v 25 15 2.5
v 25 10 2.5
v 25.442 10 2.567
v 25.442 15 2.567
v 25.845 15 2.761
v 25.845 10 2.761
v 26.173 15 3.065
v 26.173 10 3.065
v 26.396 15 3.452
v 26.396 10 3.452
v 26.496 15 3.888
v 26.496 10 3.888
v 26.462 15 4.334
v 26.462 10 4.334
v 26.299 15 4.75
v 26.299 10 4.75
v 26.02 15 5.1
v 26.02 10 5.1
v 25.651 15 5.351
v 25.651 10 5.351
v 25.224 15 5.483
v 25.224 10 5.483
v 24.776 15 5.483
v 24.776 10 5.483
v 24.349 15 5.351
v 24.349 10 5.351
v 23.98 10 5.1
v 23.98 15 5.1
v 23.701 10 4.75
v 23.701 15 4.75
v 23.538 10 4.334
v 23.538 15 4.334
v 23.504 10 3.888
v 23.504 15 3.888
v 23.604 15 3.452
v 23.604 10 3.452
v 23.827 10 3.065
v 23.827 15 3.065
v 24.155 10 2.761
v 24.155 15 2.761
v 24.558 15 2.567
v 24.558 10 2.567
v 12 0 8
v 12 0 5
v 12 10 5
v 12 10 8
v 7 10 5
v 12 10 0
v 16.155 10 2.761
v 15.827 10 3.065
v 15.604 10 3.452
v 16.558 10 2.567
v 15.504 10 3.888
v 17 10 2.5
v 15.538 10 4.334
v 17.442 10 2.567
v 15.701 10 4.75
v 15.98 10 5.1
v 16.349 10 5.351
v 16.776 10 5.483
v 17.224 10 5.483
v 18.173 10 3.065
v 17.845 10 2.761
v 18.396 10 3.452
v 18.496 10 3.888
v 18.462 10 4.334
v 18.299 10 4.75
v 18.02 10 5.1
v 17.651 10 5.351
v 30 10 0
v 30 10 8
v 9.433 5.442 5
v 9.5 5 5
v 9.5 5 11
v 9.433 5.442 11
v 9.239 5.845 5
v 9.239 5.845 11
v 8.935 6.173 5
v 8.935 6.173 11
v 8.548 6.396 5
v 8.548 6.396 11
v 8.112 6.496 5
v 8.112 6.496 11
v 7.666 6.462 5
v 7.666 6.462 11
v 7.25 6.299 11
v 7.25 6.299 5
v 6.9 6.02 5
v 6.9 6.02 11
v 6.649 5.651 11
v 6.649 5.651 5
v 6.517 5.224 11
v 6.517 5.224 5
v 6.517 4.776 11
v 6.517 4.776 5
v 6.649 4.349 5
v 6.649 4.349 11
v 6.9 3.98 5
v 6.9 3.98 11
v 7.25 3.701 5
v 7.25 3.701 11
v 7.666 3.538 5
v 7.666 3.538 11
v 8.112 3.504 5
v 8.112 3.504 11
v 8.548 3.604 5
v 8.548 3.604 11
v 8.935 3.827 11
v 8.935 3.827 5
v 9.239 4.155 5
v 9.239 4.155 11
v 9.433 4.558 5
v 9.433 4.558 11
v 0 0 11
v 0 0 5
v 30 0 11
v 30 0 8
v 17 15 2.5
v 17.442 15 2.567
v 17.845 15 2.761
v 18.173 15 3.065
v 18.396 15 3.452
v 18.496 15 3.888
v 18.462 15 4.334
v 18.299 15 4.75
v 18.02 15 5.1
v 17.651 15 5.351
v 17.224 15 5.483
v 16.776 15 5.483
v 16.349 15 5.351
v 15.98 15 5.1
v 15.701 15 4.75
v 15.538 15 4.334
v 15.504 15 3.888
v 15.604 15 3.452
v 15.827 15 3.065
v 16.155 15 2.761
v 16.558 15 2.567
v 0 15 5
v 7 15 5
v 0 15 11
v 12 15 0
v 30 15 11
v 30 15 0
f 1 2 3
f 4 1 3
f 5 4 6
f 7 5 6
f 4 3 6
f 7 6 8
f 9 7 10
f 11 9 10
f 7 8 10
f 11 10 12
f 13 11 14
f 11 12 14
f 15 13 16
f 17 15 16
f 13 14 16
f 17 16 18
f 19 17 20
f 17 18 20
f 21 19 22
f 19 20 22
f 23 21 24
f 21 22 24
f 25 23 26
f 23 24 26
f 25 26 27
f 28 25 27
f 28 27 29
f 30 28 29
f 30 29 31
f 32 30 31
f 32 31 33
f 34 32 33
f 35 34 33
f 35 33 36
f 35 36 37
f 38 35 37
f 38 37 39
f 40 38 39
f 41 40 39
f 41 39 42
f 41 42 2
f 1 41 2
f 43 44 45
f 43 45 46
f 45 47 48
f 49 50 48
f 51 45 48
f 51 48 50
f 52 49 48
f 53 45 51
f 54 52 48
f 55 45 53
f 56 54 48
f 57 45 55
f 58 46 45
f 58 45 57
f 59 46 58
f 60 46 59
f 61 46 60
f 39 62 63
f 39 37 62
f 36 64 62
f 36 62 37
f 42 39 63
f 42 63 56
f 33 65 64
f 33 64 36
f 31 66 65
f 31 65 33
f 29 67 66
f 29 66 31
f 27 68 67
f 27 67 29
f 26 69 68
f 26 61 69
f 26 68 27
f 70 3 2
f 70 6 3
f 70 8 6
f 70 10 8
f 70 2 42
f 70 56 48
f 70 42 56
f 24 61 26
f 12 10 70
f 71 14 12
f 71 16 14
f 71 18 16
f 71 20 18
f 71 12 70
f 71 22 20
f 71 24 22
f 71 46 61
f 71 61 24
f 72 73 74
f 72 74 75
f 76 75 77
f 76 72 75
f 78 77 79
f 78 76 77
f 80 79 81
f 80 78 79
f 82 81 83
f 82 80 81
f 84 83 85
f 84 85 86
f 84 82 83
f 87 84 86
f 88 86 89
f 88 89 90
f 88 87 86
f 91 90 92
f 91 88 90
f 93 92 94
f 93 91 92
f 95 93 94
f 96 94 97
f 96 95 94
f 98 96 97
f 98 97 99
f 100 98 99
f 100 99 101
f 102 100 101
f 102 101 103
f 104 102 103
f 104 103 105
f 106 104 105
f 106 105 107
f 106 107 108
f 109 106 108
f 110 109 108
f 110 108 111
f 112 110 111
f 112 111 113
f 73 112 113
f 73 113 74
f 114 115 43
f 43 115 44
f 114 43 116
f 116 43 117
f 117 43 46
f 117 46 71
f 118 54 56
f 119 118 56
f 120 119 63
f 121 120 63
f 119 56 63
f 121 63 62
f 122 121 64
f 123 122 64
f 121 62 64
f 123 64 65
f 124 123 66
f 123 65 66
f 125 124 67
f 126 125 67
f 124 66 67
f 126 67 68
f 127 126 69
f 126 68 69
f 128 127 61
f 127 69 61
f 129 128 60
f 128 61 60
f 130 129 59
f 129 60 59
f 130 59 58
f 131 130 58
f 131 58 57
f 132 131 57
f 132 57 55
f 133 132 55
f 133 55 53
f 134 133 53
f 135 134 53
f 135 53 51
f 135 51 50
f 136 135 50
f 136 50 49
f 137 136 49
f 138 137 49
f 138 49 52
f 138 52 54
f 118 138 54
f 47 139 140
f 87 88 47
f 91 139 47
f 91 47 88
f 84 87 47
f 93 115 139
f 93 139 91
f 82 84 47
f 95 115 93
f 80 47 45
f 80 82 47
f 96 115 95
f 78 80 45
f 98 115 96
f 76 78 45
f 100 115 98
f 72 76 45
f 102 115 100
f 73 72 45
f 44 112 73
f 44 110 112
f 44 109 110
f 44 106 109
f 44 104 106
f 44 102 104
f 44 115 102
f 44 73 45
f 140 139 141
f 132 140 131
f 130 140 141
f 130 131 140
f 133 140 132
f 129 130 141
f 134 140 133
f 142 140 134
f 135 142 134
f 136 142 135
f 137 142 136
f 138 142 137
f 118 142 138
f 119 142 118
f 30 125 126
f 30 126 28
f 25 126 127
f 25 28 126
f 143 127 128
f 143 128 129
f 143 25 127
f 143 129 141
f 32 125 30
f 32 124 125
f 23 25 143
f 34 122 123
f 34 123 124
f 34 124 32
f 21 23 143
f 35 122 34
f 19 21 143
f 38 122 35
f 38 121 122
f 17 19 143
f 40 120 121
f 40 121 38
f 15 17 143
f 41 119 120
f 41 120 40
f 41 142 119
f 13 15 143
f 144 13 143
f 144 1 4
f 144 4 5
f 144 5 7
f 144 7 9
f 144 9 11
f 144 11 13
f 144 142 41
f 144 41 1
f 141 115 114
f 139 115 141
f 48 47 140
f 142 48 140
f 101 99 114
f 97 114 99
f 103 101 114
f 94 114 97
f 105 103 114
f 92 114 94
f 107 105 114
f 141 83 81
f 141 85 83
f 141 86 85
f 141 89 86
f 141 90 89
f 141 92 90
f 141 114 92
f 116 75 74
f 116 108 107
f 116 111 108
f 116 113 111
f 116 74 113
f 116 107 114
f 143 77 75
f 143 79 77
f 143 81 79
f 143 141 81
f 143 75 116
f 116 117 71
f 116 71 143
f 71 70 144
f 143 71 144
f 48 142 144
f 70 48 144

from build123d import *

# Parameters (mm, degrees)
SKETCH_1_W          = 30
SKETCH_1_H          = 15
SKETCH_1_R          = 1.5
EXTRUDE_1_DEPTH     = 11
SKETCH_2_R          = 1.5
CUT_EXTRUDE_1_DEPTH = 20
SKETCH_3_W          = 12
SKETCH_3_H          = 5
CUT_EXTRUDE_2_DEPTH = 20
SKETCH_5_W          = 18
SKETCH_5_H          = 8
CUT_EXTRUDE_3_DEPTH = 10
CHAMFER_1_SIZE      = 5


with BuildPart() as part:
    # 草图1 → 凸台-拉伸1 (new body)
    with BuildSketch(Plane.XY):
        with Locations((15, 7.5)):
            Rectangle(SKETCH_1_W, SKETCH_1_H)
        with Locations((8, 5)):
            Circle(SKETCH_1_R, mode=Mode.SUBTRACT)
    extrude(amount=EXTRUDE_1_DEPTH)

    # 草图2 → 切除-拉伸1 (cut)
    with BuildSketch(Plane.XZ):
        with Locations(Location((25, 4, 0), (0, 0, 270))):
            Circle(SKETCH_2_R)
        with Locations(Location((17, 4, 0), (0, 0, 270))):
            Circle(SKETCH_2_R)
    extrude(amount=-CUT_EXTRUDE_1_DEPTH, mode=Mode.SUBTRACT)

    # 草图3 → 切除-拉伸2 (cut)
    with BuildSketch(Plane.XZ):
        with Locations((6, 2.5)):
            Rectangle(SKETCH_3_W, SKETCH_3_H)
    extrude(amount=-CUT_EXTRUDE_2_DEPTH, mode=Mode.SUBTRACT)

    # 草图5 → 切除-拉伸3 (cut)
    with BuildSketch(Plane.XZ):
        with Locations((21, 4)):
            Rectangle(SKETCH_5_W, SKETCH_5_H)
    extrude(amount=-CUT_EXTRUDE_3_DEPTH, mode=Mode.SUBTRACT)

    # 倒角1
    chamfer_1_edges = [part.edges().sort_by_distance(p)[0] for p in [
        (12, 12.5, 5),
    ]]
    chamfer(chamfer_1_edges, length=CHAMFER_1_SIZE - 0.0001)  # a hair under: the kernel refuses the full size


solid = part.part
